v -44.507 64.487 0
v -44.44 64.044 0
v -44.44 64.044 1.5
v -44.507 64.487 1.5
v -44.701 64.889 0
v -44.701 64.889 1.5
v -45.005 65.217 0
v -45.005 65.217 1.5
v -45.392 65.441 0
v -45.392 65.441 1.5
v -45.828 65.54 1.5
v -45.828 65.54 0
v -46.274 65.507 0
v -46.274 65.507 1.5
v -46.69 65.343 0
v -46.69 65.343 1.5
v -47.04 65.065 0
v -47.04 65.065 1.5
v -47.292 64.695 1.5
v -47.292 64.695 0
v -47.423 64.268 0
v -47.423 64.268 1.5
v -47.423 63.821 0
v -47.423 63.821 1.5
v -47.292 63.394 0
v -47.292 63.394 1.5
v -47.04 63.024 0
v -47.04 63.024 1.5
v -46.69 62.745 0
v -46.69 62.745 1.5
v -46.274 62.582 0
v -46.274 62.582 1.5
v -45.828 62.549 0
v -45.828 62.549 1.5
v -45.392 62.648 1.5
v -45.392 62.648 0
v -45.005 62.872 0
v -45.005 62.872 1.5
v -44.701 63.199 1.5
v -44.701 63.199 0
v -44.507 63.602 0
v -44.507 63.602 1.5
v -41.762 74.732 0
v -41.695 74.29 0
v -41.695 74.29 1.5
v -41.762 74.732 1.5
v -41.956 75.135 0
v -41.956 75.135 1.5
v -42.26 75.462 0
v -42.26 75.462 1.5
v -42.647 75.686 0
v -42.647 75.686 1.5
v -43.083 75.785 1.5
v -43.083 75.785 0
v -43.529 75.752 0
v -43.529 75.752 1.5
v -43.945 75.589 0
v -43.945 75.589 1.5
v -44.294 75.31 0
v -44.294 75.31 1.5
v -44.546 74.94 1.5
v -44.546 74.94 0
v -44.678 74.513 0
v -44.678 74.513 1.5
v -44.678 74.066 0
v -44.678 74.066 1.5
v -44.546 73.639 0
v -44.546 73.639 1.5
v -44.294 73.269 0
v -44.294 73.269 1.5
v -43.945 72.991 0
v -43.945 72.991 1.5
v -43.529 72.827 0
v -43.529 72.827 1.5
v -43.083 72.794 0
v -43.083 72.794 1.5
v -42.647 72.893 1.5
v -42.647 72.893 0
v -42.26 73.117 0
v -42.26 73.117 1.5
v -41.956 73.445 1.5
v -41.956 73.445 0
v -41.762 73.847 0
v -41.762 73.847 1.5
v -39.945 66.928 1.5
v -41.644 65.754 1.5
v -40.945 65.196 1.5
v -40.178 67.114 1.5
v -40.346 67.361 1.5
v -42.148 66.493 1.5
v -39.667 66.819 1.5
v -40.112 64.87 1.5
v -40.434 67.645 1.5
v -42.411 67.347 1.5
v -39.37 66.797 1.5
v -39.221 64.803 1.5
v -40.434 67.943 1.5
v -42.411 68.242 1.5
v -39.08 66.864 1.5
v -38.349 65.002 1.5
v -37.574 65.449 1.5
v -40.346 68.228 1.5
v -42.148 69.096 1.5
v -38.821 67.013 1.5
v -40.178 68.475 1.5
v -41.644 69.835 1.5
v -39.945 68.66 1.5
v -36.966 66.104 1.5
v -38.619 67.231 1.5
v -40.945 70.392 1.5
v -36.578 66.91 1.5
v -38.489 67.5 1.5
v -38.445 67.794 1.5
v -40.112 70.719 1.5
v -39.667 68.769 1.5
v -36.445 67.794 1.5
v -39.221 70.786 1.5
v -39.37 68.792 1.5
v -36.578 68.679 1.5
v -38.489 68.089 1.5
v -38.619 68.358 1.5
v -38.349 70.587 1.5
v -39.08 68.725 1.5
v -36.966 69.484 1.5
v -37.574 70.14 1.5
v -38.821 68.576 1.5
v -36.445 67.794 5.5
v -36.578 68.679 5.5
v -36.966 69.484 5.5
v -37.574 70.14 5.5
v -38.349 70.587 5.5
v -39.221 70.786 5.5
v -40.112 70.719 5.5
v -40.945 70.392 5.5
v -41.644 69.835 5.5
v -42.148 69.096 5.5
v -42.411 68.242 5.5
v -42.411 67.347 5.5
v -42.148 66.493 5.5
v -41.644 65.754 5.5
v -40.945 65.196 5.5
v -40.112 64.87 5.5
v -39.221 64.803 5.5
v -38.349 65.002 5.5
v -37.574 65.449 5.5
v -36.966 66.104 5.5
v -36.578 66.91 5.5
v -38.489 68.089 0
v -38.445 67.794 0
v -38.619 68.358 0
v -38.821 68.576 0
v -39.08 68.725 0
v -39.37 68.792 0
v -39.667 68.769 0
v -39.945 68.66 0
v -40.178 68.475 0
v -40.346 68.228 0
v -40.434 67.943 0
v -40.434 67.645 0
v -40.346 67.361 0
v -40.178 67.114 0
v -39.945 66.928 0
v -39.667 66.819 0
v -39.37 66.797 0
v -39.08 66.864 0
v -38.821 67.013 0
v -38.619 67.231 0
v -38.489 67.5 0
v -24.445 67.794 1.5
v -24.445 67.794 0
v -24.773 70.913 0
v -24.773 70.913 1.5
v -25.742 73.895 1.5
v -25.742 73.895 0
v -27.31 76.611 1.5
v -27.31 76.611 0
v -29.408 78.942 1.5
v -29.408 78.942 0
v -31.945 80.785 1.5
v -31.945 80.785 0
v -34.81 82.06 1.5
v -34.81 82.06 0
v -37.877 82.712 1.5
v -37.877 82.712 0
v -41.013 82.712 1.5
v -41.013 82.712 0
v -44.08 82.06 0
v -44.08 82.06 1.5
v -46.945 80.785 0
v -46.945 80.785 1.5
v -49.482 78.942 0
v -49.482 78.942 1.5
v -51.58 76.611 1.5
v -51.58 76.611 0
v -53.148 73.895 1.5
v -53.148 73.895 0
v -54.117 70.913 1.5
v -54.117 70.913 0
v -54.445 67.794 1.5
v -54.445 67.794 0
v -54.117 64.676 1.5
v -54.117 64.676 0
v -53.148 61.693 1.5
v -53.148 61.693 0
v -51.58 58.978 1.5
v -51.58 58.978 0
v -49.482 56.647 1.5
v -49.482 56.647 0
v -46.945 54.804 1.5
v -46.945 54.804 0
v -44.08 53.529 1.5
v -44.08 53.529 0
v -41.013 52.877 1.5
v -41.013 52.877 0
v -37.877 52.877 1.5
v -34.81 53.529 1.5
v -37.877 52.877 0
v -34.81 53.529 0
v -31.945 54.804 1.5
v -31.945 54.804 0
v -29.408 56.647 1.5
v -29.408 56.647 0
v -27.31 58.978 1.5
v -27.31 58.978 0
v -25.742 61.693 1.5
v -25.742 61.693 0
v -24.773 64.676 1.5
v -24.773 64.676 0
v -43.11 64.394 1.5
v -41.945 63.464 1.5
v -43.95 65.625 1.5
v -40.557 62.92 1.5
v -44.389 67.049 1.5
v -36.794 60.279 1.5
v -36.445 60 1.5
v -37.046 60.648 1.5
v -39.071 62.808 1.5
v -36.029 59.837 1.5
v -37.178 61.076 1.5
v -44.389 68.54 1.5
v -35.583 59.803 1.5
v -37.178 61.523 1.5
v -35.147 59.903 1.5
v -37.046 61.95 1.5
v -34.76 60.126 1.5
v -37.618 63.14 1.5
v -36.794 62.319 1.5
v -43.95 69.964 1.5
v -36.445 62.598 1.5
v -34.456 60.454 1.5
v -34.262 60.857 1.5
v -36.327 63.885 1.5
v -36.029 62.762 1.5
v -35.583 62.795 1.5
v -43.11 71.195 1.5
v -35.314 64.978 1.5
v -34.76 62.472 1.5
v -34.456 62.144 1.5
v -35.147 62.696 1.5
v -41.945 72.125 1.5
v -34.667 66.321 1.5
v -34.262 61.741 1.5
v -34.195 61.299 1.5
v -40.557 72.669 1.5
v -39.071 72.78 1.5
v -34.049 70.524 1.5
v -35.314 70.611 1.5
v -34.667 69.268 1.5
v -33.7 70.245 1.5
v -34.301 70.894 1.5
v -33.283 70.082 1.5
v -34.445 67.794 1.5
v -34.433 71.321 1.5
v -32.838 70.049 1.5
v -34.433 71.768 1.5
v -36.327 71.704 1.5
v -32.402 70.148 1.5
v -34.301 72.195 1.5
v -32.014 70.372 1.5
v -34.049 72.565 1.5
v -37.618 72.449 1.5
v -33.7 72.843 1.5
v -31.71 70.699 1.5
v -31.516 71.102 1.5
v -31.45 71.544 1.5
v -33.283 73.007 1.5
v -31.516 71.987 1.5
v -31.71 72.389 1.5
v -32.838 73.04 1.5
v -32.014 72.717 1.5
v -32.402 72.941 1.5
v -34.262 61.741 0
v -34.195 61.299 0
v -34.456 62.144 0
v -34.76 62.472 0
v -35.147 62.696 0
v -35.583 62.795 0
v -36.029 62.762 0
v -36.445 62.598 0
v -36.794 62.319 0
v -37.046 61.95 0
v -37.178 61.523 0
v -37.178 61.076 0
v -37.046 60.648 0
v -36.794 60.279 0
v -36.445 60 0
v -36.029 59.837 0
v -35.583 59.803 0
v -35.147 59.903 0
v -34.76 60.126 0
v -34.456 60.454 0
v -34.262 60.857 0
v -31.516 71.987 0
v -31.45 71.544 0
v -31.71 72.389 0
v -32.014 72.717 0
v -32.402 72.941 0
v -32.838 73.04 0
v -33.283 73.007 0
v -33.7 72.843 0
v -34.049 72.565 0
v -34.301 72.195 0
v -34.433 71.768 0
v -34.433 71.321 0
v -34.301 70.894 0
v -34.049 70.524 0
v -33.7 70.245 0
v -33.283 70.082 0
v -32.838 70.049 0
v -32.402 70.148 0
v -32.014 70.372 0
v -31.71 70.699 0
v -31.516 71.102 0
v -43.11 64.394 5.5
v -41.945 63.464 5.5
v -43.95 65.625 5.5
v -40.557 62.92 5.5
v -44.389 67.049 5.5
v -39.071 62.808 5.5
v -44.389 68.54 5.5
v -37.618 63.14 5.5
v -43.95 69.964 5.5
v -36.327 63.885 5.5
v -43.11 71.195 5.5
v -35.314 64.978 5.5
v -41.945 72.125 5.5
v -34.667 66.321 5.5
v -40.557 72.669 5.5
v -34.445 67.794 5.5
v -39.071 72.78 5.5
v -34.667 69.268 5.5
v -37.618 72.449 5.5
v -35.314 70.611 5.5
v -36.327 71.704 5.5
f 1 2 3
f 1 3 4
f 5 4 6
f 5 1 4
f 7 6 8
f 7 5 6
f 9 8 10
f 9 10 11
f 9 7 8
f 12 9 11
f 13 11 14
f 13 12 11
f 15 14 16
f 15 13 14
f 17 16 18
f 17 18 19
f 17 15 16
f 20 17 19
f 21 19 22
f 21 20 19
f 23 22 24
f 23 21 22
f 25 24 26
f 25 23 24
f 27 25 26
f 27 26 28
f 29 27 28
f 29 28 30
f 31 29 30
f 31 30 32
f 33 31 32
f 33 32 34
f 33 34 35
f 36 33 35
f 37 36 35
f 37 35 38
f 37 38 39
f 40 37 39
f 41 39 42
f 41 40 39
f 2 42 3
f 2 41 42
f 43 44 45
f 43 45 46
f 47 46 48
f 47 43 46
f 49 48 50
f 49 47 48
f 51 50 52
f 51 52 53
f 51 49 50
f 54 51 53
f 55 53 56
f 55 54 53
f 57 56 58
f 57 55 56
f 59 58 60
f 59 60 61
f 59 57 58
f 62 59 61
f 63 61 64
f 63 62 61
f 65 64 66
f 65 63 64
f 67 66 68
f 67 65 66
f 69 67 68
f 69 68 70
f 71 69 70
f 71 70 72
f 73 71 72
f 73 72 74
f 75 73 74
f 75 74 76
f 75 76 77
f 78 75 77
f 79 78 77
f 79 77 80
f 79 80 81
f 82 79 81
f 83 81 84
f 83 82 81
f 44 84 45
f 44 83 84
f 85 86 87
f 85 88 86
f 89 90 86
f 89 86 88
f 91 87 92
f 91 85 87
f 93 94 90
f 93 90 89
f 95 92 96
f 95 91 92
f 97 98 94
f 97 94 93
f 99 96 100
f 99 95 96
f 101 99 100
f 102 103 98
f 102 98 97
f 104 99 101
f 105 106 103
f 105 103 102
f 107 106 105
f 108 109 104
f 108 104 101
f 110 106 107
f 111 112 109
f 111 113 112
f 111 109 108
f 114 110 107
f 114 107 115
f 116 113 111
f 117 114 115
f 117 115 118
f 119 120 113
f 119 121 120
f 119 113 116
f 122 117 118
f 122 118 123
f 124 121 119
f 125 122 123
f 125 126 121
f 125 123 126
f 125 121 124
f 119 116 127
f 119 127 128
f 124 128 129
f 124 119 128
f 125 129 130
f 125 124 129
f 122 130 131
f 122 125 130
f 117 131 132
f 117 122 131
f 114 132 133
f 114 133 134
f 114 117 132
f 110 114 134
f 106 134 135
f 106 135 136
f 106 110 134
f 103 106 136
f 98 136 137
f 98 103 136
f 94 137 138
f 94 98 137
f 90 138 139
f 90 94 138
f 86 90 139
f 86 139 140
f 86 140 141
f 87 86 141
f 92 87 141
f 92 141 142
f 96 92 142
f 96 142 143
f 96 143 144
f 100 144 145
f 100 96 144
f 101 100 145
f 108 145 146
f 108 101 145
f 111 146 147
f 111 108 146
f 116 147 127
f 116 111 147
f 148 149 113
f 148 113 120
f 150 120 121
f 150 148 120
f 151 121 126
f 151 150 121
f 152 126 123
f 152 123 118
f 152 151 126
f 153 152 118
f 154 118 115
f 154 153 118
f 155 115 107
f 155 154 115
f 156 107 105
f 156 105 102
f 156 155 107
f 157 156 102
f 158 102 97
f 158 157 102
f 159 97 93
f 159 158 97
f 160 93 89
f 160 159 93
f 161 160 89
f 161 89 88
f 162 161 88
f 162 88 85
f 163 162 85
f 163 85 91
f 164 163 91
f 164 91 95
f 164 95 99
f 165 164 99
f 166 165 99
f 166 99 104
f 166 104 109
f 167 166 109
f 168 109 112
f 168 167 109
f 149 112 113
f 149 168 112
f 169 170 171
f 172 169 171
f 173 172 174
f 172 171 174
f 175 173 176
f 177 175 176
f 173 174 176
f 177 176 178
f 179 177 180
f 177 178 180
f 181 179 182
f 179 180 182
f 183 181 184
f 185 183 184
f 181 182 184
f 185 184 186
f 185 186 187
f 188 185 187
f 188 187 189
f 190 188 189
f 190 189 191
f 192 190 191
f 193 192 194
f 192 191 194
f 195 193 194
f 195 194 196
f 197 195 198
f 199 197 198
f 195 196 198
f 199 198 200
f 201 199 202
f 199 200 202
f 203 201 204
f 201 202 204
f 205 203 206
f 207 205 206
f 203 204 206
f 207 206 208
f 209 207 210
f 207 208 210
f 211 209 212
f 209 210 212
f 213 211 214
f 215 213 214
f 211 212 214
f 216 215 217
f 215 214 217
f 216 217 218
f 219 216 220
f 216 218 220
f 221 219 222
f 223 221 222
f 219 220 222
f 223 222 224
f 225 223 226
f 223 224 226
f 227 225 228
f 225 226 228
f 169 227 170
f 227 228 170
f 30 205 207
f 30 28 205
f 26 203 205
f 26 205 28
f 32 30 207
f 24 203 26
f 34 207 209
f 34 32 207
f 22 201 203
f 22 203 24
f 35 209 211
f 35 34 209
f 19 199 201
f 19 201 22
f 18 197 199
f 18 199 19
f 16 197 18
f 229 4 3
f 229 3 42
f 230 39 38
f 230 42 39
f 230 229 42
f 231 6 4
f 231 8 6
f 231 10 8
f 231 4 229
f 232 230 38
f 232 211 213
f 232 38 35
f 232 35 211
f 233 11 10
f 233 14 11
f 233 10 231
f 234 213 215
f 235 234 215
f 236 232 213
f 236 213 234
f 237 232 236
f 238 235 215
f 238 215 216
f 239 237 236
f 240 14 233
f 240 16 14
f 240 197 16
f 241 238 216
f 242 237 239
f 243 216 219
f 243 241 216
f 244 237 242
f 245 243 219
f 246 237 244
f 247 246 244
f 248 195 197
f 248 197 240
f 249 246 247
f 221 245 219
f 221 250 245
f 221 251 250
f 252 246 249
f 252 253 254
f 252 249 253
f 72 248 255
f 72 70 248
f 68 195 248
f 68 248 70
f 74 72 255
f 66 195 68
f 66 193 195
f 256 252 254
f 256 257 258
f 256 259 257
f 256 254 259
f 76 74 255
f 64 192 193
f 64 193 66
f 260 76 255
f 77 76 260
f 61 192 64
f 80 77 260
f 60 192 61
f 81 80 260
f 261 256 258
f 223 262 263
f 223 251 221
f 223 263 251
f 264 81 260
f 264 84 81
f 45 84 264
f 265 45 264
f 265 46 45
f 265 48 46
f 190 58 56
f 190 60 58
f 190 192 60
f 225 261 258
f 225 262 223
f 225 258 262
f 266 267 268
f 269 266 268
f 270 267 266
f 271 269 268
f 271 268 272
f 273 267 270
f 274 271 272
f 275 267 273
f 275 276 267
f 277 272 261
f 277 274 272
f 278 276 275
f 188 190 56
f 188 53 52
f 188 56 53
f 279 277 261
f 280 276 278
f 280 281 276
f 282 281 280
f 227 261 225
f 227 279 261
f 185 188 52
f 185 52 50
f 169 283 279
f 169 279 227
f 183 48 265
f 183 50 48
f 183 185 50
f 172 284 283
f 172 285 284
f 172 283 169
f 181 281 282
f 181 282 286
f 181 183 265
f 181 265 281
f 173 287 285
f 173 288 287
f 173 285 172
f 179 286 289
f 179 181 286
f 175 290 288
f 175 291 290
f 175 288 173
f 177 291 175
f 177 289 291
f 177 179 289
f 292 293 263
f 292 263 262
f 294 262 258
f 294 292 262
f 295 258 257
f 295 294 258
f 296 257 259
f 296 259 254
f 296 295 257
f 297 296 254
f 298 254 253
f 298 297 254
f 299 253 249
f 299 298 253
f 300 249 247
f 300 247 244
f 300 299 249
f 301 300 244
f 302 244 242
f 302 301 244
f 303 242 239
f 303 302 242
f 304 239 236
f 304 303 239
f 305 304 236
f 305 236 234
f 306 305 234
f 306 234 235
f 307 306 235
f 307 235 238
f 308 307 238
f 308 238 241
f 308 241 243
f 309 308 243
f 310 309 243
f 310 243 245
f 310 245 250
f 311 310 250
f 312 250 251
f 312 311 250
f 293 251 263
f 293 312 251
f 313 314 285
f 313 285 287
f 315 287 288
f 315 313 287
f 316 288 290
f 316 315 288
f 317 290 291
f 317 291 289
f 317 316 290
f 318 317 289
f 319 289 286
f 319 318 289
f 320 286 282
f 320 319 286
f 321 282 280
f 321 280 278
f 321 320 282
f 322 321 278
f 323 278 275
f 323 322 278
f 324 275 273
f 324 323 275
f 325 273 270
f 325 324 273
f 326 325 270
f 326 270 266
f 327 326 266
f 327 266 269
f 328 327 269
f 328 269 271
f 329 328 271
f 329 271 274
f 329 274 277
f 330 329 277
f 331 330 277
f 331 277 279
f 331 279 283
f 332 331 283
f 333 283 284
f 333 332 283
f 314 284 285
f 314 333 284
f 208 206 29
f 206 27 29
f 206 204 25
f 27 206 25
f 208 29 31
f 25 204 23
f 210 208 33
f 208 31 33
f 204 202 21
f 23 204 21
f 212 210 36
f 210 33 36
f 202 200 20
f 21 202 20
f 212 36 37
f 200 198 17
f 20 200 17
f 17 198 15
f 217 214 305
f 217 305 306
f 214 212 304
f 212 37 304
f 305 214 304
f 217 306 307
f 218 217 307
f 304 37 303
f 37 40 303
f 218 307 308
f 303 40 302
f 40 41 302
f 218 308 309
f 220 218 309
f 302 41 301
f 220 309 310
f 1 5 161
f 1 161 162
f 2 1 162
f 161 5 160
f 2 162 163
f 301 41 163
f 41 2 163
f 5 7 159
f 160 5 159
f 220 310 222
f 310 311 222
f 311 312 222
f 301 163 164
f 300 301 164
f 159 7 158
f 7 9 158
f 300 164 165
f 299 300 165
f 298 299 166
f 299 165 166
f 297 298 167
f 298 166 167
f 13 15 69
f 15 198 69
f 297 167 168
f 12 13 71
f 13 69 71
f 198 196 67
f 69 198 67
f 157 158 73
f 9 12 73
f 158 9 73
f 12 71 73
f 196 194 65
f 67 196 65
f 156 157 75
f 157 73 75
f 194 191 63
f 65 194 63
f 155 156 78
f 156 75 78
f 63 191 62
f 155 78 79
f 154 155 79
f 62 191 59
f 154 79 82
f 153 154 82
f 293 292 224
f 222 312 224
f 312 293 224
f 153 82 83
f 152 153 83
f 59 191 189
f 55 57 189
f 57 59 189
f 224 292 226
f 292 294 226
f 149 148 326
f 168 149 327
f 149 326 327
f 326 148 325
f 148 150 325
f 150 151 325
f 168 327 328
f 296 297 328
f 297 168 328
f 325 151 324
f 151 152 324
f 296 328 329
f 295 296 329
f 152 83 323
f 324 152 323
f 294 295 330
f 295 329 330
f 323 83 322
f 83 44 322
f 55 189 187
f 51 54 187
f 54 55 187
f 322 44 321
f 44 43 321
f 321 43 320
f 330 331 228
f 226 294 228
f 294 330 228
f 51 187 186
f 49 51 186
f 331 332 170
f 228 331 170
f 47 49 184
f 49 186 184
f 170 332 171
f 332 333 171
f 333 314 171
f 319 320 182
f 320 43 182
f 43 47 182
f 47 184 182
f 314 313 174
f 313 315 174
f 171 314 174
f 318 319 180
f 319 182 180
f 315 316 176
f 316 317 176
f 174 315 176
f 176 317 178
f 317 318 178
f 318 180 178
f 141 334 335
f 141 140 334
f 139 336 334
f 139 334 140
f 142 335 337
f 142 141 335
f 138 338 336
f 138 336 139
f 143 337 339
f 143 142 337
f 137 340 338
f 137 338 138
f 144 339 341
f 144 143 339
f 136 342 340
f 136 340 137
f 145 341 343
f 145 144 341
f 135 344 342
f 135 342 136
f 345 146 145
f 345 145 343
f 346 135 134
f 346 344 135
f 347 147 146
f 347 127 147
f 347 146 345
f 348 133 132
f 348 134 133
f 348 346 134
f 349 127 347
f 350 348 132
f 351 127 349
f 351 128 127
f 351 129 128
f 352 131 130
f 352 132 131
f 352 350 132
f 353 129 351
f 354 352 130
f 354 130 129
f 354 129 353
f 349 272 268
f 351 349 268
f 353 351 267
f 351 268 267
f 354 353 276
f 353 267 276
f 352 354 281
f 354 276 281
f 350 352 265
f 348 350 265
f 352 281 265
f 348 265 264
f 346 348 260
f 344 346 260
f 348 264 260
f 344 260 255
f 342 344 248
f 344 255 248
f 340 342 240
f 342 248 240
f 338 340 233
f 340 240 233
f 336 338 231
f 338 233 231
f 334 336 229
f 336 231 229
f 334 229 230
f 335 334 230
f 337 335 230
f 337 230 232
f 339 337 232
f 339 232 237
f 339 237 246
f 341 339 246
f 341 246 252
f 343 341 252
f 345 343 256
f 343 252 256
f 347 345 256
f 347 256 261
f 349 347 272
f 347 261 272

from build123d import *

# Parameters (mm, degrees)
SKETCH1_R           = 15
SKETCH1_R_2         = 1.5
SKETCH1_R_3         = 1
BOSS_EXTRUDE1_DEPTH = 1.5
SKETCH2_R           = 5
SKETCH2_R_2         = 3
BOSS_EXTRUDE2_DEPTH = 4


with BuildPart() as part:
    # Sketch1 → Boss-Extrude1 (new body)
    with BuildSketch(Plane.XY):
        with Locations((-39.444879197, 67.794412983)):
            Circle(SKETCH1_R)
        with Locations((-32.949688669, 71.544412983)):
            Circle(SKETCH1_R_2, mode=Mode.SUBTRACT)
        with Locations((-45.940069726, 64.044412983)):
            Circle(SKETCH1_R_2, mode=Mode.SUBTRACT)
        with Locations((-39.444879197, 67.794412983)):
            Circle(SKETCH1_R_3, mode=Mode.SUBTRACT)
        with Locations((-35.694879197, 61.299222454)):
            Circle(SKETCH1_R_2, mode=Mode.SUBTRACT)
        with Locations((-43.194879197, 74.289603511)):
            Circle(SKETCH1_R_2, mode=Mode.SUBTRACT)
    extrude(amount=BOSS_EXTRUDE1_DEPTH)

    # Sketch2 → Boss-Extrude2 (add)
    with BuildSketch(Plane.XY.offset(1.5)):
        with Locations((-39.444879197, 67.794412983)):
            Circle(SKETCH2_R)
        with Locations((-39.444879197, 67.794412983)):
            Circle(SKETCH2_R_2, mode=Mode.SUBTRACT)
    extrude(amount=BOSS_EXTRUDE2_DEPTH)


solid = part.part
